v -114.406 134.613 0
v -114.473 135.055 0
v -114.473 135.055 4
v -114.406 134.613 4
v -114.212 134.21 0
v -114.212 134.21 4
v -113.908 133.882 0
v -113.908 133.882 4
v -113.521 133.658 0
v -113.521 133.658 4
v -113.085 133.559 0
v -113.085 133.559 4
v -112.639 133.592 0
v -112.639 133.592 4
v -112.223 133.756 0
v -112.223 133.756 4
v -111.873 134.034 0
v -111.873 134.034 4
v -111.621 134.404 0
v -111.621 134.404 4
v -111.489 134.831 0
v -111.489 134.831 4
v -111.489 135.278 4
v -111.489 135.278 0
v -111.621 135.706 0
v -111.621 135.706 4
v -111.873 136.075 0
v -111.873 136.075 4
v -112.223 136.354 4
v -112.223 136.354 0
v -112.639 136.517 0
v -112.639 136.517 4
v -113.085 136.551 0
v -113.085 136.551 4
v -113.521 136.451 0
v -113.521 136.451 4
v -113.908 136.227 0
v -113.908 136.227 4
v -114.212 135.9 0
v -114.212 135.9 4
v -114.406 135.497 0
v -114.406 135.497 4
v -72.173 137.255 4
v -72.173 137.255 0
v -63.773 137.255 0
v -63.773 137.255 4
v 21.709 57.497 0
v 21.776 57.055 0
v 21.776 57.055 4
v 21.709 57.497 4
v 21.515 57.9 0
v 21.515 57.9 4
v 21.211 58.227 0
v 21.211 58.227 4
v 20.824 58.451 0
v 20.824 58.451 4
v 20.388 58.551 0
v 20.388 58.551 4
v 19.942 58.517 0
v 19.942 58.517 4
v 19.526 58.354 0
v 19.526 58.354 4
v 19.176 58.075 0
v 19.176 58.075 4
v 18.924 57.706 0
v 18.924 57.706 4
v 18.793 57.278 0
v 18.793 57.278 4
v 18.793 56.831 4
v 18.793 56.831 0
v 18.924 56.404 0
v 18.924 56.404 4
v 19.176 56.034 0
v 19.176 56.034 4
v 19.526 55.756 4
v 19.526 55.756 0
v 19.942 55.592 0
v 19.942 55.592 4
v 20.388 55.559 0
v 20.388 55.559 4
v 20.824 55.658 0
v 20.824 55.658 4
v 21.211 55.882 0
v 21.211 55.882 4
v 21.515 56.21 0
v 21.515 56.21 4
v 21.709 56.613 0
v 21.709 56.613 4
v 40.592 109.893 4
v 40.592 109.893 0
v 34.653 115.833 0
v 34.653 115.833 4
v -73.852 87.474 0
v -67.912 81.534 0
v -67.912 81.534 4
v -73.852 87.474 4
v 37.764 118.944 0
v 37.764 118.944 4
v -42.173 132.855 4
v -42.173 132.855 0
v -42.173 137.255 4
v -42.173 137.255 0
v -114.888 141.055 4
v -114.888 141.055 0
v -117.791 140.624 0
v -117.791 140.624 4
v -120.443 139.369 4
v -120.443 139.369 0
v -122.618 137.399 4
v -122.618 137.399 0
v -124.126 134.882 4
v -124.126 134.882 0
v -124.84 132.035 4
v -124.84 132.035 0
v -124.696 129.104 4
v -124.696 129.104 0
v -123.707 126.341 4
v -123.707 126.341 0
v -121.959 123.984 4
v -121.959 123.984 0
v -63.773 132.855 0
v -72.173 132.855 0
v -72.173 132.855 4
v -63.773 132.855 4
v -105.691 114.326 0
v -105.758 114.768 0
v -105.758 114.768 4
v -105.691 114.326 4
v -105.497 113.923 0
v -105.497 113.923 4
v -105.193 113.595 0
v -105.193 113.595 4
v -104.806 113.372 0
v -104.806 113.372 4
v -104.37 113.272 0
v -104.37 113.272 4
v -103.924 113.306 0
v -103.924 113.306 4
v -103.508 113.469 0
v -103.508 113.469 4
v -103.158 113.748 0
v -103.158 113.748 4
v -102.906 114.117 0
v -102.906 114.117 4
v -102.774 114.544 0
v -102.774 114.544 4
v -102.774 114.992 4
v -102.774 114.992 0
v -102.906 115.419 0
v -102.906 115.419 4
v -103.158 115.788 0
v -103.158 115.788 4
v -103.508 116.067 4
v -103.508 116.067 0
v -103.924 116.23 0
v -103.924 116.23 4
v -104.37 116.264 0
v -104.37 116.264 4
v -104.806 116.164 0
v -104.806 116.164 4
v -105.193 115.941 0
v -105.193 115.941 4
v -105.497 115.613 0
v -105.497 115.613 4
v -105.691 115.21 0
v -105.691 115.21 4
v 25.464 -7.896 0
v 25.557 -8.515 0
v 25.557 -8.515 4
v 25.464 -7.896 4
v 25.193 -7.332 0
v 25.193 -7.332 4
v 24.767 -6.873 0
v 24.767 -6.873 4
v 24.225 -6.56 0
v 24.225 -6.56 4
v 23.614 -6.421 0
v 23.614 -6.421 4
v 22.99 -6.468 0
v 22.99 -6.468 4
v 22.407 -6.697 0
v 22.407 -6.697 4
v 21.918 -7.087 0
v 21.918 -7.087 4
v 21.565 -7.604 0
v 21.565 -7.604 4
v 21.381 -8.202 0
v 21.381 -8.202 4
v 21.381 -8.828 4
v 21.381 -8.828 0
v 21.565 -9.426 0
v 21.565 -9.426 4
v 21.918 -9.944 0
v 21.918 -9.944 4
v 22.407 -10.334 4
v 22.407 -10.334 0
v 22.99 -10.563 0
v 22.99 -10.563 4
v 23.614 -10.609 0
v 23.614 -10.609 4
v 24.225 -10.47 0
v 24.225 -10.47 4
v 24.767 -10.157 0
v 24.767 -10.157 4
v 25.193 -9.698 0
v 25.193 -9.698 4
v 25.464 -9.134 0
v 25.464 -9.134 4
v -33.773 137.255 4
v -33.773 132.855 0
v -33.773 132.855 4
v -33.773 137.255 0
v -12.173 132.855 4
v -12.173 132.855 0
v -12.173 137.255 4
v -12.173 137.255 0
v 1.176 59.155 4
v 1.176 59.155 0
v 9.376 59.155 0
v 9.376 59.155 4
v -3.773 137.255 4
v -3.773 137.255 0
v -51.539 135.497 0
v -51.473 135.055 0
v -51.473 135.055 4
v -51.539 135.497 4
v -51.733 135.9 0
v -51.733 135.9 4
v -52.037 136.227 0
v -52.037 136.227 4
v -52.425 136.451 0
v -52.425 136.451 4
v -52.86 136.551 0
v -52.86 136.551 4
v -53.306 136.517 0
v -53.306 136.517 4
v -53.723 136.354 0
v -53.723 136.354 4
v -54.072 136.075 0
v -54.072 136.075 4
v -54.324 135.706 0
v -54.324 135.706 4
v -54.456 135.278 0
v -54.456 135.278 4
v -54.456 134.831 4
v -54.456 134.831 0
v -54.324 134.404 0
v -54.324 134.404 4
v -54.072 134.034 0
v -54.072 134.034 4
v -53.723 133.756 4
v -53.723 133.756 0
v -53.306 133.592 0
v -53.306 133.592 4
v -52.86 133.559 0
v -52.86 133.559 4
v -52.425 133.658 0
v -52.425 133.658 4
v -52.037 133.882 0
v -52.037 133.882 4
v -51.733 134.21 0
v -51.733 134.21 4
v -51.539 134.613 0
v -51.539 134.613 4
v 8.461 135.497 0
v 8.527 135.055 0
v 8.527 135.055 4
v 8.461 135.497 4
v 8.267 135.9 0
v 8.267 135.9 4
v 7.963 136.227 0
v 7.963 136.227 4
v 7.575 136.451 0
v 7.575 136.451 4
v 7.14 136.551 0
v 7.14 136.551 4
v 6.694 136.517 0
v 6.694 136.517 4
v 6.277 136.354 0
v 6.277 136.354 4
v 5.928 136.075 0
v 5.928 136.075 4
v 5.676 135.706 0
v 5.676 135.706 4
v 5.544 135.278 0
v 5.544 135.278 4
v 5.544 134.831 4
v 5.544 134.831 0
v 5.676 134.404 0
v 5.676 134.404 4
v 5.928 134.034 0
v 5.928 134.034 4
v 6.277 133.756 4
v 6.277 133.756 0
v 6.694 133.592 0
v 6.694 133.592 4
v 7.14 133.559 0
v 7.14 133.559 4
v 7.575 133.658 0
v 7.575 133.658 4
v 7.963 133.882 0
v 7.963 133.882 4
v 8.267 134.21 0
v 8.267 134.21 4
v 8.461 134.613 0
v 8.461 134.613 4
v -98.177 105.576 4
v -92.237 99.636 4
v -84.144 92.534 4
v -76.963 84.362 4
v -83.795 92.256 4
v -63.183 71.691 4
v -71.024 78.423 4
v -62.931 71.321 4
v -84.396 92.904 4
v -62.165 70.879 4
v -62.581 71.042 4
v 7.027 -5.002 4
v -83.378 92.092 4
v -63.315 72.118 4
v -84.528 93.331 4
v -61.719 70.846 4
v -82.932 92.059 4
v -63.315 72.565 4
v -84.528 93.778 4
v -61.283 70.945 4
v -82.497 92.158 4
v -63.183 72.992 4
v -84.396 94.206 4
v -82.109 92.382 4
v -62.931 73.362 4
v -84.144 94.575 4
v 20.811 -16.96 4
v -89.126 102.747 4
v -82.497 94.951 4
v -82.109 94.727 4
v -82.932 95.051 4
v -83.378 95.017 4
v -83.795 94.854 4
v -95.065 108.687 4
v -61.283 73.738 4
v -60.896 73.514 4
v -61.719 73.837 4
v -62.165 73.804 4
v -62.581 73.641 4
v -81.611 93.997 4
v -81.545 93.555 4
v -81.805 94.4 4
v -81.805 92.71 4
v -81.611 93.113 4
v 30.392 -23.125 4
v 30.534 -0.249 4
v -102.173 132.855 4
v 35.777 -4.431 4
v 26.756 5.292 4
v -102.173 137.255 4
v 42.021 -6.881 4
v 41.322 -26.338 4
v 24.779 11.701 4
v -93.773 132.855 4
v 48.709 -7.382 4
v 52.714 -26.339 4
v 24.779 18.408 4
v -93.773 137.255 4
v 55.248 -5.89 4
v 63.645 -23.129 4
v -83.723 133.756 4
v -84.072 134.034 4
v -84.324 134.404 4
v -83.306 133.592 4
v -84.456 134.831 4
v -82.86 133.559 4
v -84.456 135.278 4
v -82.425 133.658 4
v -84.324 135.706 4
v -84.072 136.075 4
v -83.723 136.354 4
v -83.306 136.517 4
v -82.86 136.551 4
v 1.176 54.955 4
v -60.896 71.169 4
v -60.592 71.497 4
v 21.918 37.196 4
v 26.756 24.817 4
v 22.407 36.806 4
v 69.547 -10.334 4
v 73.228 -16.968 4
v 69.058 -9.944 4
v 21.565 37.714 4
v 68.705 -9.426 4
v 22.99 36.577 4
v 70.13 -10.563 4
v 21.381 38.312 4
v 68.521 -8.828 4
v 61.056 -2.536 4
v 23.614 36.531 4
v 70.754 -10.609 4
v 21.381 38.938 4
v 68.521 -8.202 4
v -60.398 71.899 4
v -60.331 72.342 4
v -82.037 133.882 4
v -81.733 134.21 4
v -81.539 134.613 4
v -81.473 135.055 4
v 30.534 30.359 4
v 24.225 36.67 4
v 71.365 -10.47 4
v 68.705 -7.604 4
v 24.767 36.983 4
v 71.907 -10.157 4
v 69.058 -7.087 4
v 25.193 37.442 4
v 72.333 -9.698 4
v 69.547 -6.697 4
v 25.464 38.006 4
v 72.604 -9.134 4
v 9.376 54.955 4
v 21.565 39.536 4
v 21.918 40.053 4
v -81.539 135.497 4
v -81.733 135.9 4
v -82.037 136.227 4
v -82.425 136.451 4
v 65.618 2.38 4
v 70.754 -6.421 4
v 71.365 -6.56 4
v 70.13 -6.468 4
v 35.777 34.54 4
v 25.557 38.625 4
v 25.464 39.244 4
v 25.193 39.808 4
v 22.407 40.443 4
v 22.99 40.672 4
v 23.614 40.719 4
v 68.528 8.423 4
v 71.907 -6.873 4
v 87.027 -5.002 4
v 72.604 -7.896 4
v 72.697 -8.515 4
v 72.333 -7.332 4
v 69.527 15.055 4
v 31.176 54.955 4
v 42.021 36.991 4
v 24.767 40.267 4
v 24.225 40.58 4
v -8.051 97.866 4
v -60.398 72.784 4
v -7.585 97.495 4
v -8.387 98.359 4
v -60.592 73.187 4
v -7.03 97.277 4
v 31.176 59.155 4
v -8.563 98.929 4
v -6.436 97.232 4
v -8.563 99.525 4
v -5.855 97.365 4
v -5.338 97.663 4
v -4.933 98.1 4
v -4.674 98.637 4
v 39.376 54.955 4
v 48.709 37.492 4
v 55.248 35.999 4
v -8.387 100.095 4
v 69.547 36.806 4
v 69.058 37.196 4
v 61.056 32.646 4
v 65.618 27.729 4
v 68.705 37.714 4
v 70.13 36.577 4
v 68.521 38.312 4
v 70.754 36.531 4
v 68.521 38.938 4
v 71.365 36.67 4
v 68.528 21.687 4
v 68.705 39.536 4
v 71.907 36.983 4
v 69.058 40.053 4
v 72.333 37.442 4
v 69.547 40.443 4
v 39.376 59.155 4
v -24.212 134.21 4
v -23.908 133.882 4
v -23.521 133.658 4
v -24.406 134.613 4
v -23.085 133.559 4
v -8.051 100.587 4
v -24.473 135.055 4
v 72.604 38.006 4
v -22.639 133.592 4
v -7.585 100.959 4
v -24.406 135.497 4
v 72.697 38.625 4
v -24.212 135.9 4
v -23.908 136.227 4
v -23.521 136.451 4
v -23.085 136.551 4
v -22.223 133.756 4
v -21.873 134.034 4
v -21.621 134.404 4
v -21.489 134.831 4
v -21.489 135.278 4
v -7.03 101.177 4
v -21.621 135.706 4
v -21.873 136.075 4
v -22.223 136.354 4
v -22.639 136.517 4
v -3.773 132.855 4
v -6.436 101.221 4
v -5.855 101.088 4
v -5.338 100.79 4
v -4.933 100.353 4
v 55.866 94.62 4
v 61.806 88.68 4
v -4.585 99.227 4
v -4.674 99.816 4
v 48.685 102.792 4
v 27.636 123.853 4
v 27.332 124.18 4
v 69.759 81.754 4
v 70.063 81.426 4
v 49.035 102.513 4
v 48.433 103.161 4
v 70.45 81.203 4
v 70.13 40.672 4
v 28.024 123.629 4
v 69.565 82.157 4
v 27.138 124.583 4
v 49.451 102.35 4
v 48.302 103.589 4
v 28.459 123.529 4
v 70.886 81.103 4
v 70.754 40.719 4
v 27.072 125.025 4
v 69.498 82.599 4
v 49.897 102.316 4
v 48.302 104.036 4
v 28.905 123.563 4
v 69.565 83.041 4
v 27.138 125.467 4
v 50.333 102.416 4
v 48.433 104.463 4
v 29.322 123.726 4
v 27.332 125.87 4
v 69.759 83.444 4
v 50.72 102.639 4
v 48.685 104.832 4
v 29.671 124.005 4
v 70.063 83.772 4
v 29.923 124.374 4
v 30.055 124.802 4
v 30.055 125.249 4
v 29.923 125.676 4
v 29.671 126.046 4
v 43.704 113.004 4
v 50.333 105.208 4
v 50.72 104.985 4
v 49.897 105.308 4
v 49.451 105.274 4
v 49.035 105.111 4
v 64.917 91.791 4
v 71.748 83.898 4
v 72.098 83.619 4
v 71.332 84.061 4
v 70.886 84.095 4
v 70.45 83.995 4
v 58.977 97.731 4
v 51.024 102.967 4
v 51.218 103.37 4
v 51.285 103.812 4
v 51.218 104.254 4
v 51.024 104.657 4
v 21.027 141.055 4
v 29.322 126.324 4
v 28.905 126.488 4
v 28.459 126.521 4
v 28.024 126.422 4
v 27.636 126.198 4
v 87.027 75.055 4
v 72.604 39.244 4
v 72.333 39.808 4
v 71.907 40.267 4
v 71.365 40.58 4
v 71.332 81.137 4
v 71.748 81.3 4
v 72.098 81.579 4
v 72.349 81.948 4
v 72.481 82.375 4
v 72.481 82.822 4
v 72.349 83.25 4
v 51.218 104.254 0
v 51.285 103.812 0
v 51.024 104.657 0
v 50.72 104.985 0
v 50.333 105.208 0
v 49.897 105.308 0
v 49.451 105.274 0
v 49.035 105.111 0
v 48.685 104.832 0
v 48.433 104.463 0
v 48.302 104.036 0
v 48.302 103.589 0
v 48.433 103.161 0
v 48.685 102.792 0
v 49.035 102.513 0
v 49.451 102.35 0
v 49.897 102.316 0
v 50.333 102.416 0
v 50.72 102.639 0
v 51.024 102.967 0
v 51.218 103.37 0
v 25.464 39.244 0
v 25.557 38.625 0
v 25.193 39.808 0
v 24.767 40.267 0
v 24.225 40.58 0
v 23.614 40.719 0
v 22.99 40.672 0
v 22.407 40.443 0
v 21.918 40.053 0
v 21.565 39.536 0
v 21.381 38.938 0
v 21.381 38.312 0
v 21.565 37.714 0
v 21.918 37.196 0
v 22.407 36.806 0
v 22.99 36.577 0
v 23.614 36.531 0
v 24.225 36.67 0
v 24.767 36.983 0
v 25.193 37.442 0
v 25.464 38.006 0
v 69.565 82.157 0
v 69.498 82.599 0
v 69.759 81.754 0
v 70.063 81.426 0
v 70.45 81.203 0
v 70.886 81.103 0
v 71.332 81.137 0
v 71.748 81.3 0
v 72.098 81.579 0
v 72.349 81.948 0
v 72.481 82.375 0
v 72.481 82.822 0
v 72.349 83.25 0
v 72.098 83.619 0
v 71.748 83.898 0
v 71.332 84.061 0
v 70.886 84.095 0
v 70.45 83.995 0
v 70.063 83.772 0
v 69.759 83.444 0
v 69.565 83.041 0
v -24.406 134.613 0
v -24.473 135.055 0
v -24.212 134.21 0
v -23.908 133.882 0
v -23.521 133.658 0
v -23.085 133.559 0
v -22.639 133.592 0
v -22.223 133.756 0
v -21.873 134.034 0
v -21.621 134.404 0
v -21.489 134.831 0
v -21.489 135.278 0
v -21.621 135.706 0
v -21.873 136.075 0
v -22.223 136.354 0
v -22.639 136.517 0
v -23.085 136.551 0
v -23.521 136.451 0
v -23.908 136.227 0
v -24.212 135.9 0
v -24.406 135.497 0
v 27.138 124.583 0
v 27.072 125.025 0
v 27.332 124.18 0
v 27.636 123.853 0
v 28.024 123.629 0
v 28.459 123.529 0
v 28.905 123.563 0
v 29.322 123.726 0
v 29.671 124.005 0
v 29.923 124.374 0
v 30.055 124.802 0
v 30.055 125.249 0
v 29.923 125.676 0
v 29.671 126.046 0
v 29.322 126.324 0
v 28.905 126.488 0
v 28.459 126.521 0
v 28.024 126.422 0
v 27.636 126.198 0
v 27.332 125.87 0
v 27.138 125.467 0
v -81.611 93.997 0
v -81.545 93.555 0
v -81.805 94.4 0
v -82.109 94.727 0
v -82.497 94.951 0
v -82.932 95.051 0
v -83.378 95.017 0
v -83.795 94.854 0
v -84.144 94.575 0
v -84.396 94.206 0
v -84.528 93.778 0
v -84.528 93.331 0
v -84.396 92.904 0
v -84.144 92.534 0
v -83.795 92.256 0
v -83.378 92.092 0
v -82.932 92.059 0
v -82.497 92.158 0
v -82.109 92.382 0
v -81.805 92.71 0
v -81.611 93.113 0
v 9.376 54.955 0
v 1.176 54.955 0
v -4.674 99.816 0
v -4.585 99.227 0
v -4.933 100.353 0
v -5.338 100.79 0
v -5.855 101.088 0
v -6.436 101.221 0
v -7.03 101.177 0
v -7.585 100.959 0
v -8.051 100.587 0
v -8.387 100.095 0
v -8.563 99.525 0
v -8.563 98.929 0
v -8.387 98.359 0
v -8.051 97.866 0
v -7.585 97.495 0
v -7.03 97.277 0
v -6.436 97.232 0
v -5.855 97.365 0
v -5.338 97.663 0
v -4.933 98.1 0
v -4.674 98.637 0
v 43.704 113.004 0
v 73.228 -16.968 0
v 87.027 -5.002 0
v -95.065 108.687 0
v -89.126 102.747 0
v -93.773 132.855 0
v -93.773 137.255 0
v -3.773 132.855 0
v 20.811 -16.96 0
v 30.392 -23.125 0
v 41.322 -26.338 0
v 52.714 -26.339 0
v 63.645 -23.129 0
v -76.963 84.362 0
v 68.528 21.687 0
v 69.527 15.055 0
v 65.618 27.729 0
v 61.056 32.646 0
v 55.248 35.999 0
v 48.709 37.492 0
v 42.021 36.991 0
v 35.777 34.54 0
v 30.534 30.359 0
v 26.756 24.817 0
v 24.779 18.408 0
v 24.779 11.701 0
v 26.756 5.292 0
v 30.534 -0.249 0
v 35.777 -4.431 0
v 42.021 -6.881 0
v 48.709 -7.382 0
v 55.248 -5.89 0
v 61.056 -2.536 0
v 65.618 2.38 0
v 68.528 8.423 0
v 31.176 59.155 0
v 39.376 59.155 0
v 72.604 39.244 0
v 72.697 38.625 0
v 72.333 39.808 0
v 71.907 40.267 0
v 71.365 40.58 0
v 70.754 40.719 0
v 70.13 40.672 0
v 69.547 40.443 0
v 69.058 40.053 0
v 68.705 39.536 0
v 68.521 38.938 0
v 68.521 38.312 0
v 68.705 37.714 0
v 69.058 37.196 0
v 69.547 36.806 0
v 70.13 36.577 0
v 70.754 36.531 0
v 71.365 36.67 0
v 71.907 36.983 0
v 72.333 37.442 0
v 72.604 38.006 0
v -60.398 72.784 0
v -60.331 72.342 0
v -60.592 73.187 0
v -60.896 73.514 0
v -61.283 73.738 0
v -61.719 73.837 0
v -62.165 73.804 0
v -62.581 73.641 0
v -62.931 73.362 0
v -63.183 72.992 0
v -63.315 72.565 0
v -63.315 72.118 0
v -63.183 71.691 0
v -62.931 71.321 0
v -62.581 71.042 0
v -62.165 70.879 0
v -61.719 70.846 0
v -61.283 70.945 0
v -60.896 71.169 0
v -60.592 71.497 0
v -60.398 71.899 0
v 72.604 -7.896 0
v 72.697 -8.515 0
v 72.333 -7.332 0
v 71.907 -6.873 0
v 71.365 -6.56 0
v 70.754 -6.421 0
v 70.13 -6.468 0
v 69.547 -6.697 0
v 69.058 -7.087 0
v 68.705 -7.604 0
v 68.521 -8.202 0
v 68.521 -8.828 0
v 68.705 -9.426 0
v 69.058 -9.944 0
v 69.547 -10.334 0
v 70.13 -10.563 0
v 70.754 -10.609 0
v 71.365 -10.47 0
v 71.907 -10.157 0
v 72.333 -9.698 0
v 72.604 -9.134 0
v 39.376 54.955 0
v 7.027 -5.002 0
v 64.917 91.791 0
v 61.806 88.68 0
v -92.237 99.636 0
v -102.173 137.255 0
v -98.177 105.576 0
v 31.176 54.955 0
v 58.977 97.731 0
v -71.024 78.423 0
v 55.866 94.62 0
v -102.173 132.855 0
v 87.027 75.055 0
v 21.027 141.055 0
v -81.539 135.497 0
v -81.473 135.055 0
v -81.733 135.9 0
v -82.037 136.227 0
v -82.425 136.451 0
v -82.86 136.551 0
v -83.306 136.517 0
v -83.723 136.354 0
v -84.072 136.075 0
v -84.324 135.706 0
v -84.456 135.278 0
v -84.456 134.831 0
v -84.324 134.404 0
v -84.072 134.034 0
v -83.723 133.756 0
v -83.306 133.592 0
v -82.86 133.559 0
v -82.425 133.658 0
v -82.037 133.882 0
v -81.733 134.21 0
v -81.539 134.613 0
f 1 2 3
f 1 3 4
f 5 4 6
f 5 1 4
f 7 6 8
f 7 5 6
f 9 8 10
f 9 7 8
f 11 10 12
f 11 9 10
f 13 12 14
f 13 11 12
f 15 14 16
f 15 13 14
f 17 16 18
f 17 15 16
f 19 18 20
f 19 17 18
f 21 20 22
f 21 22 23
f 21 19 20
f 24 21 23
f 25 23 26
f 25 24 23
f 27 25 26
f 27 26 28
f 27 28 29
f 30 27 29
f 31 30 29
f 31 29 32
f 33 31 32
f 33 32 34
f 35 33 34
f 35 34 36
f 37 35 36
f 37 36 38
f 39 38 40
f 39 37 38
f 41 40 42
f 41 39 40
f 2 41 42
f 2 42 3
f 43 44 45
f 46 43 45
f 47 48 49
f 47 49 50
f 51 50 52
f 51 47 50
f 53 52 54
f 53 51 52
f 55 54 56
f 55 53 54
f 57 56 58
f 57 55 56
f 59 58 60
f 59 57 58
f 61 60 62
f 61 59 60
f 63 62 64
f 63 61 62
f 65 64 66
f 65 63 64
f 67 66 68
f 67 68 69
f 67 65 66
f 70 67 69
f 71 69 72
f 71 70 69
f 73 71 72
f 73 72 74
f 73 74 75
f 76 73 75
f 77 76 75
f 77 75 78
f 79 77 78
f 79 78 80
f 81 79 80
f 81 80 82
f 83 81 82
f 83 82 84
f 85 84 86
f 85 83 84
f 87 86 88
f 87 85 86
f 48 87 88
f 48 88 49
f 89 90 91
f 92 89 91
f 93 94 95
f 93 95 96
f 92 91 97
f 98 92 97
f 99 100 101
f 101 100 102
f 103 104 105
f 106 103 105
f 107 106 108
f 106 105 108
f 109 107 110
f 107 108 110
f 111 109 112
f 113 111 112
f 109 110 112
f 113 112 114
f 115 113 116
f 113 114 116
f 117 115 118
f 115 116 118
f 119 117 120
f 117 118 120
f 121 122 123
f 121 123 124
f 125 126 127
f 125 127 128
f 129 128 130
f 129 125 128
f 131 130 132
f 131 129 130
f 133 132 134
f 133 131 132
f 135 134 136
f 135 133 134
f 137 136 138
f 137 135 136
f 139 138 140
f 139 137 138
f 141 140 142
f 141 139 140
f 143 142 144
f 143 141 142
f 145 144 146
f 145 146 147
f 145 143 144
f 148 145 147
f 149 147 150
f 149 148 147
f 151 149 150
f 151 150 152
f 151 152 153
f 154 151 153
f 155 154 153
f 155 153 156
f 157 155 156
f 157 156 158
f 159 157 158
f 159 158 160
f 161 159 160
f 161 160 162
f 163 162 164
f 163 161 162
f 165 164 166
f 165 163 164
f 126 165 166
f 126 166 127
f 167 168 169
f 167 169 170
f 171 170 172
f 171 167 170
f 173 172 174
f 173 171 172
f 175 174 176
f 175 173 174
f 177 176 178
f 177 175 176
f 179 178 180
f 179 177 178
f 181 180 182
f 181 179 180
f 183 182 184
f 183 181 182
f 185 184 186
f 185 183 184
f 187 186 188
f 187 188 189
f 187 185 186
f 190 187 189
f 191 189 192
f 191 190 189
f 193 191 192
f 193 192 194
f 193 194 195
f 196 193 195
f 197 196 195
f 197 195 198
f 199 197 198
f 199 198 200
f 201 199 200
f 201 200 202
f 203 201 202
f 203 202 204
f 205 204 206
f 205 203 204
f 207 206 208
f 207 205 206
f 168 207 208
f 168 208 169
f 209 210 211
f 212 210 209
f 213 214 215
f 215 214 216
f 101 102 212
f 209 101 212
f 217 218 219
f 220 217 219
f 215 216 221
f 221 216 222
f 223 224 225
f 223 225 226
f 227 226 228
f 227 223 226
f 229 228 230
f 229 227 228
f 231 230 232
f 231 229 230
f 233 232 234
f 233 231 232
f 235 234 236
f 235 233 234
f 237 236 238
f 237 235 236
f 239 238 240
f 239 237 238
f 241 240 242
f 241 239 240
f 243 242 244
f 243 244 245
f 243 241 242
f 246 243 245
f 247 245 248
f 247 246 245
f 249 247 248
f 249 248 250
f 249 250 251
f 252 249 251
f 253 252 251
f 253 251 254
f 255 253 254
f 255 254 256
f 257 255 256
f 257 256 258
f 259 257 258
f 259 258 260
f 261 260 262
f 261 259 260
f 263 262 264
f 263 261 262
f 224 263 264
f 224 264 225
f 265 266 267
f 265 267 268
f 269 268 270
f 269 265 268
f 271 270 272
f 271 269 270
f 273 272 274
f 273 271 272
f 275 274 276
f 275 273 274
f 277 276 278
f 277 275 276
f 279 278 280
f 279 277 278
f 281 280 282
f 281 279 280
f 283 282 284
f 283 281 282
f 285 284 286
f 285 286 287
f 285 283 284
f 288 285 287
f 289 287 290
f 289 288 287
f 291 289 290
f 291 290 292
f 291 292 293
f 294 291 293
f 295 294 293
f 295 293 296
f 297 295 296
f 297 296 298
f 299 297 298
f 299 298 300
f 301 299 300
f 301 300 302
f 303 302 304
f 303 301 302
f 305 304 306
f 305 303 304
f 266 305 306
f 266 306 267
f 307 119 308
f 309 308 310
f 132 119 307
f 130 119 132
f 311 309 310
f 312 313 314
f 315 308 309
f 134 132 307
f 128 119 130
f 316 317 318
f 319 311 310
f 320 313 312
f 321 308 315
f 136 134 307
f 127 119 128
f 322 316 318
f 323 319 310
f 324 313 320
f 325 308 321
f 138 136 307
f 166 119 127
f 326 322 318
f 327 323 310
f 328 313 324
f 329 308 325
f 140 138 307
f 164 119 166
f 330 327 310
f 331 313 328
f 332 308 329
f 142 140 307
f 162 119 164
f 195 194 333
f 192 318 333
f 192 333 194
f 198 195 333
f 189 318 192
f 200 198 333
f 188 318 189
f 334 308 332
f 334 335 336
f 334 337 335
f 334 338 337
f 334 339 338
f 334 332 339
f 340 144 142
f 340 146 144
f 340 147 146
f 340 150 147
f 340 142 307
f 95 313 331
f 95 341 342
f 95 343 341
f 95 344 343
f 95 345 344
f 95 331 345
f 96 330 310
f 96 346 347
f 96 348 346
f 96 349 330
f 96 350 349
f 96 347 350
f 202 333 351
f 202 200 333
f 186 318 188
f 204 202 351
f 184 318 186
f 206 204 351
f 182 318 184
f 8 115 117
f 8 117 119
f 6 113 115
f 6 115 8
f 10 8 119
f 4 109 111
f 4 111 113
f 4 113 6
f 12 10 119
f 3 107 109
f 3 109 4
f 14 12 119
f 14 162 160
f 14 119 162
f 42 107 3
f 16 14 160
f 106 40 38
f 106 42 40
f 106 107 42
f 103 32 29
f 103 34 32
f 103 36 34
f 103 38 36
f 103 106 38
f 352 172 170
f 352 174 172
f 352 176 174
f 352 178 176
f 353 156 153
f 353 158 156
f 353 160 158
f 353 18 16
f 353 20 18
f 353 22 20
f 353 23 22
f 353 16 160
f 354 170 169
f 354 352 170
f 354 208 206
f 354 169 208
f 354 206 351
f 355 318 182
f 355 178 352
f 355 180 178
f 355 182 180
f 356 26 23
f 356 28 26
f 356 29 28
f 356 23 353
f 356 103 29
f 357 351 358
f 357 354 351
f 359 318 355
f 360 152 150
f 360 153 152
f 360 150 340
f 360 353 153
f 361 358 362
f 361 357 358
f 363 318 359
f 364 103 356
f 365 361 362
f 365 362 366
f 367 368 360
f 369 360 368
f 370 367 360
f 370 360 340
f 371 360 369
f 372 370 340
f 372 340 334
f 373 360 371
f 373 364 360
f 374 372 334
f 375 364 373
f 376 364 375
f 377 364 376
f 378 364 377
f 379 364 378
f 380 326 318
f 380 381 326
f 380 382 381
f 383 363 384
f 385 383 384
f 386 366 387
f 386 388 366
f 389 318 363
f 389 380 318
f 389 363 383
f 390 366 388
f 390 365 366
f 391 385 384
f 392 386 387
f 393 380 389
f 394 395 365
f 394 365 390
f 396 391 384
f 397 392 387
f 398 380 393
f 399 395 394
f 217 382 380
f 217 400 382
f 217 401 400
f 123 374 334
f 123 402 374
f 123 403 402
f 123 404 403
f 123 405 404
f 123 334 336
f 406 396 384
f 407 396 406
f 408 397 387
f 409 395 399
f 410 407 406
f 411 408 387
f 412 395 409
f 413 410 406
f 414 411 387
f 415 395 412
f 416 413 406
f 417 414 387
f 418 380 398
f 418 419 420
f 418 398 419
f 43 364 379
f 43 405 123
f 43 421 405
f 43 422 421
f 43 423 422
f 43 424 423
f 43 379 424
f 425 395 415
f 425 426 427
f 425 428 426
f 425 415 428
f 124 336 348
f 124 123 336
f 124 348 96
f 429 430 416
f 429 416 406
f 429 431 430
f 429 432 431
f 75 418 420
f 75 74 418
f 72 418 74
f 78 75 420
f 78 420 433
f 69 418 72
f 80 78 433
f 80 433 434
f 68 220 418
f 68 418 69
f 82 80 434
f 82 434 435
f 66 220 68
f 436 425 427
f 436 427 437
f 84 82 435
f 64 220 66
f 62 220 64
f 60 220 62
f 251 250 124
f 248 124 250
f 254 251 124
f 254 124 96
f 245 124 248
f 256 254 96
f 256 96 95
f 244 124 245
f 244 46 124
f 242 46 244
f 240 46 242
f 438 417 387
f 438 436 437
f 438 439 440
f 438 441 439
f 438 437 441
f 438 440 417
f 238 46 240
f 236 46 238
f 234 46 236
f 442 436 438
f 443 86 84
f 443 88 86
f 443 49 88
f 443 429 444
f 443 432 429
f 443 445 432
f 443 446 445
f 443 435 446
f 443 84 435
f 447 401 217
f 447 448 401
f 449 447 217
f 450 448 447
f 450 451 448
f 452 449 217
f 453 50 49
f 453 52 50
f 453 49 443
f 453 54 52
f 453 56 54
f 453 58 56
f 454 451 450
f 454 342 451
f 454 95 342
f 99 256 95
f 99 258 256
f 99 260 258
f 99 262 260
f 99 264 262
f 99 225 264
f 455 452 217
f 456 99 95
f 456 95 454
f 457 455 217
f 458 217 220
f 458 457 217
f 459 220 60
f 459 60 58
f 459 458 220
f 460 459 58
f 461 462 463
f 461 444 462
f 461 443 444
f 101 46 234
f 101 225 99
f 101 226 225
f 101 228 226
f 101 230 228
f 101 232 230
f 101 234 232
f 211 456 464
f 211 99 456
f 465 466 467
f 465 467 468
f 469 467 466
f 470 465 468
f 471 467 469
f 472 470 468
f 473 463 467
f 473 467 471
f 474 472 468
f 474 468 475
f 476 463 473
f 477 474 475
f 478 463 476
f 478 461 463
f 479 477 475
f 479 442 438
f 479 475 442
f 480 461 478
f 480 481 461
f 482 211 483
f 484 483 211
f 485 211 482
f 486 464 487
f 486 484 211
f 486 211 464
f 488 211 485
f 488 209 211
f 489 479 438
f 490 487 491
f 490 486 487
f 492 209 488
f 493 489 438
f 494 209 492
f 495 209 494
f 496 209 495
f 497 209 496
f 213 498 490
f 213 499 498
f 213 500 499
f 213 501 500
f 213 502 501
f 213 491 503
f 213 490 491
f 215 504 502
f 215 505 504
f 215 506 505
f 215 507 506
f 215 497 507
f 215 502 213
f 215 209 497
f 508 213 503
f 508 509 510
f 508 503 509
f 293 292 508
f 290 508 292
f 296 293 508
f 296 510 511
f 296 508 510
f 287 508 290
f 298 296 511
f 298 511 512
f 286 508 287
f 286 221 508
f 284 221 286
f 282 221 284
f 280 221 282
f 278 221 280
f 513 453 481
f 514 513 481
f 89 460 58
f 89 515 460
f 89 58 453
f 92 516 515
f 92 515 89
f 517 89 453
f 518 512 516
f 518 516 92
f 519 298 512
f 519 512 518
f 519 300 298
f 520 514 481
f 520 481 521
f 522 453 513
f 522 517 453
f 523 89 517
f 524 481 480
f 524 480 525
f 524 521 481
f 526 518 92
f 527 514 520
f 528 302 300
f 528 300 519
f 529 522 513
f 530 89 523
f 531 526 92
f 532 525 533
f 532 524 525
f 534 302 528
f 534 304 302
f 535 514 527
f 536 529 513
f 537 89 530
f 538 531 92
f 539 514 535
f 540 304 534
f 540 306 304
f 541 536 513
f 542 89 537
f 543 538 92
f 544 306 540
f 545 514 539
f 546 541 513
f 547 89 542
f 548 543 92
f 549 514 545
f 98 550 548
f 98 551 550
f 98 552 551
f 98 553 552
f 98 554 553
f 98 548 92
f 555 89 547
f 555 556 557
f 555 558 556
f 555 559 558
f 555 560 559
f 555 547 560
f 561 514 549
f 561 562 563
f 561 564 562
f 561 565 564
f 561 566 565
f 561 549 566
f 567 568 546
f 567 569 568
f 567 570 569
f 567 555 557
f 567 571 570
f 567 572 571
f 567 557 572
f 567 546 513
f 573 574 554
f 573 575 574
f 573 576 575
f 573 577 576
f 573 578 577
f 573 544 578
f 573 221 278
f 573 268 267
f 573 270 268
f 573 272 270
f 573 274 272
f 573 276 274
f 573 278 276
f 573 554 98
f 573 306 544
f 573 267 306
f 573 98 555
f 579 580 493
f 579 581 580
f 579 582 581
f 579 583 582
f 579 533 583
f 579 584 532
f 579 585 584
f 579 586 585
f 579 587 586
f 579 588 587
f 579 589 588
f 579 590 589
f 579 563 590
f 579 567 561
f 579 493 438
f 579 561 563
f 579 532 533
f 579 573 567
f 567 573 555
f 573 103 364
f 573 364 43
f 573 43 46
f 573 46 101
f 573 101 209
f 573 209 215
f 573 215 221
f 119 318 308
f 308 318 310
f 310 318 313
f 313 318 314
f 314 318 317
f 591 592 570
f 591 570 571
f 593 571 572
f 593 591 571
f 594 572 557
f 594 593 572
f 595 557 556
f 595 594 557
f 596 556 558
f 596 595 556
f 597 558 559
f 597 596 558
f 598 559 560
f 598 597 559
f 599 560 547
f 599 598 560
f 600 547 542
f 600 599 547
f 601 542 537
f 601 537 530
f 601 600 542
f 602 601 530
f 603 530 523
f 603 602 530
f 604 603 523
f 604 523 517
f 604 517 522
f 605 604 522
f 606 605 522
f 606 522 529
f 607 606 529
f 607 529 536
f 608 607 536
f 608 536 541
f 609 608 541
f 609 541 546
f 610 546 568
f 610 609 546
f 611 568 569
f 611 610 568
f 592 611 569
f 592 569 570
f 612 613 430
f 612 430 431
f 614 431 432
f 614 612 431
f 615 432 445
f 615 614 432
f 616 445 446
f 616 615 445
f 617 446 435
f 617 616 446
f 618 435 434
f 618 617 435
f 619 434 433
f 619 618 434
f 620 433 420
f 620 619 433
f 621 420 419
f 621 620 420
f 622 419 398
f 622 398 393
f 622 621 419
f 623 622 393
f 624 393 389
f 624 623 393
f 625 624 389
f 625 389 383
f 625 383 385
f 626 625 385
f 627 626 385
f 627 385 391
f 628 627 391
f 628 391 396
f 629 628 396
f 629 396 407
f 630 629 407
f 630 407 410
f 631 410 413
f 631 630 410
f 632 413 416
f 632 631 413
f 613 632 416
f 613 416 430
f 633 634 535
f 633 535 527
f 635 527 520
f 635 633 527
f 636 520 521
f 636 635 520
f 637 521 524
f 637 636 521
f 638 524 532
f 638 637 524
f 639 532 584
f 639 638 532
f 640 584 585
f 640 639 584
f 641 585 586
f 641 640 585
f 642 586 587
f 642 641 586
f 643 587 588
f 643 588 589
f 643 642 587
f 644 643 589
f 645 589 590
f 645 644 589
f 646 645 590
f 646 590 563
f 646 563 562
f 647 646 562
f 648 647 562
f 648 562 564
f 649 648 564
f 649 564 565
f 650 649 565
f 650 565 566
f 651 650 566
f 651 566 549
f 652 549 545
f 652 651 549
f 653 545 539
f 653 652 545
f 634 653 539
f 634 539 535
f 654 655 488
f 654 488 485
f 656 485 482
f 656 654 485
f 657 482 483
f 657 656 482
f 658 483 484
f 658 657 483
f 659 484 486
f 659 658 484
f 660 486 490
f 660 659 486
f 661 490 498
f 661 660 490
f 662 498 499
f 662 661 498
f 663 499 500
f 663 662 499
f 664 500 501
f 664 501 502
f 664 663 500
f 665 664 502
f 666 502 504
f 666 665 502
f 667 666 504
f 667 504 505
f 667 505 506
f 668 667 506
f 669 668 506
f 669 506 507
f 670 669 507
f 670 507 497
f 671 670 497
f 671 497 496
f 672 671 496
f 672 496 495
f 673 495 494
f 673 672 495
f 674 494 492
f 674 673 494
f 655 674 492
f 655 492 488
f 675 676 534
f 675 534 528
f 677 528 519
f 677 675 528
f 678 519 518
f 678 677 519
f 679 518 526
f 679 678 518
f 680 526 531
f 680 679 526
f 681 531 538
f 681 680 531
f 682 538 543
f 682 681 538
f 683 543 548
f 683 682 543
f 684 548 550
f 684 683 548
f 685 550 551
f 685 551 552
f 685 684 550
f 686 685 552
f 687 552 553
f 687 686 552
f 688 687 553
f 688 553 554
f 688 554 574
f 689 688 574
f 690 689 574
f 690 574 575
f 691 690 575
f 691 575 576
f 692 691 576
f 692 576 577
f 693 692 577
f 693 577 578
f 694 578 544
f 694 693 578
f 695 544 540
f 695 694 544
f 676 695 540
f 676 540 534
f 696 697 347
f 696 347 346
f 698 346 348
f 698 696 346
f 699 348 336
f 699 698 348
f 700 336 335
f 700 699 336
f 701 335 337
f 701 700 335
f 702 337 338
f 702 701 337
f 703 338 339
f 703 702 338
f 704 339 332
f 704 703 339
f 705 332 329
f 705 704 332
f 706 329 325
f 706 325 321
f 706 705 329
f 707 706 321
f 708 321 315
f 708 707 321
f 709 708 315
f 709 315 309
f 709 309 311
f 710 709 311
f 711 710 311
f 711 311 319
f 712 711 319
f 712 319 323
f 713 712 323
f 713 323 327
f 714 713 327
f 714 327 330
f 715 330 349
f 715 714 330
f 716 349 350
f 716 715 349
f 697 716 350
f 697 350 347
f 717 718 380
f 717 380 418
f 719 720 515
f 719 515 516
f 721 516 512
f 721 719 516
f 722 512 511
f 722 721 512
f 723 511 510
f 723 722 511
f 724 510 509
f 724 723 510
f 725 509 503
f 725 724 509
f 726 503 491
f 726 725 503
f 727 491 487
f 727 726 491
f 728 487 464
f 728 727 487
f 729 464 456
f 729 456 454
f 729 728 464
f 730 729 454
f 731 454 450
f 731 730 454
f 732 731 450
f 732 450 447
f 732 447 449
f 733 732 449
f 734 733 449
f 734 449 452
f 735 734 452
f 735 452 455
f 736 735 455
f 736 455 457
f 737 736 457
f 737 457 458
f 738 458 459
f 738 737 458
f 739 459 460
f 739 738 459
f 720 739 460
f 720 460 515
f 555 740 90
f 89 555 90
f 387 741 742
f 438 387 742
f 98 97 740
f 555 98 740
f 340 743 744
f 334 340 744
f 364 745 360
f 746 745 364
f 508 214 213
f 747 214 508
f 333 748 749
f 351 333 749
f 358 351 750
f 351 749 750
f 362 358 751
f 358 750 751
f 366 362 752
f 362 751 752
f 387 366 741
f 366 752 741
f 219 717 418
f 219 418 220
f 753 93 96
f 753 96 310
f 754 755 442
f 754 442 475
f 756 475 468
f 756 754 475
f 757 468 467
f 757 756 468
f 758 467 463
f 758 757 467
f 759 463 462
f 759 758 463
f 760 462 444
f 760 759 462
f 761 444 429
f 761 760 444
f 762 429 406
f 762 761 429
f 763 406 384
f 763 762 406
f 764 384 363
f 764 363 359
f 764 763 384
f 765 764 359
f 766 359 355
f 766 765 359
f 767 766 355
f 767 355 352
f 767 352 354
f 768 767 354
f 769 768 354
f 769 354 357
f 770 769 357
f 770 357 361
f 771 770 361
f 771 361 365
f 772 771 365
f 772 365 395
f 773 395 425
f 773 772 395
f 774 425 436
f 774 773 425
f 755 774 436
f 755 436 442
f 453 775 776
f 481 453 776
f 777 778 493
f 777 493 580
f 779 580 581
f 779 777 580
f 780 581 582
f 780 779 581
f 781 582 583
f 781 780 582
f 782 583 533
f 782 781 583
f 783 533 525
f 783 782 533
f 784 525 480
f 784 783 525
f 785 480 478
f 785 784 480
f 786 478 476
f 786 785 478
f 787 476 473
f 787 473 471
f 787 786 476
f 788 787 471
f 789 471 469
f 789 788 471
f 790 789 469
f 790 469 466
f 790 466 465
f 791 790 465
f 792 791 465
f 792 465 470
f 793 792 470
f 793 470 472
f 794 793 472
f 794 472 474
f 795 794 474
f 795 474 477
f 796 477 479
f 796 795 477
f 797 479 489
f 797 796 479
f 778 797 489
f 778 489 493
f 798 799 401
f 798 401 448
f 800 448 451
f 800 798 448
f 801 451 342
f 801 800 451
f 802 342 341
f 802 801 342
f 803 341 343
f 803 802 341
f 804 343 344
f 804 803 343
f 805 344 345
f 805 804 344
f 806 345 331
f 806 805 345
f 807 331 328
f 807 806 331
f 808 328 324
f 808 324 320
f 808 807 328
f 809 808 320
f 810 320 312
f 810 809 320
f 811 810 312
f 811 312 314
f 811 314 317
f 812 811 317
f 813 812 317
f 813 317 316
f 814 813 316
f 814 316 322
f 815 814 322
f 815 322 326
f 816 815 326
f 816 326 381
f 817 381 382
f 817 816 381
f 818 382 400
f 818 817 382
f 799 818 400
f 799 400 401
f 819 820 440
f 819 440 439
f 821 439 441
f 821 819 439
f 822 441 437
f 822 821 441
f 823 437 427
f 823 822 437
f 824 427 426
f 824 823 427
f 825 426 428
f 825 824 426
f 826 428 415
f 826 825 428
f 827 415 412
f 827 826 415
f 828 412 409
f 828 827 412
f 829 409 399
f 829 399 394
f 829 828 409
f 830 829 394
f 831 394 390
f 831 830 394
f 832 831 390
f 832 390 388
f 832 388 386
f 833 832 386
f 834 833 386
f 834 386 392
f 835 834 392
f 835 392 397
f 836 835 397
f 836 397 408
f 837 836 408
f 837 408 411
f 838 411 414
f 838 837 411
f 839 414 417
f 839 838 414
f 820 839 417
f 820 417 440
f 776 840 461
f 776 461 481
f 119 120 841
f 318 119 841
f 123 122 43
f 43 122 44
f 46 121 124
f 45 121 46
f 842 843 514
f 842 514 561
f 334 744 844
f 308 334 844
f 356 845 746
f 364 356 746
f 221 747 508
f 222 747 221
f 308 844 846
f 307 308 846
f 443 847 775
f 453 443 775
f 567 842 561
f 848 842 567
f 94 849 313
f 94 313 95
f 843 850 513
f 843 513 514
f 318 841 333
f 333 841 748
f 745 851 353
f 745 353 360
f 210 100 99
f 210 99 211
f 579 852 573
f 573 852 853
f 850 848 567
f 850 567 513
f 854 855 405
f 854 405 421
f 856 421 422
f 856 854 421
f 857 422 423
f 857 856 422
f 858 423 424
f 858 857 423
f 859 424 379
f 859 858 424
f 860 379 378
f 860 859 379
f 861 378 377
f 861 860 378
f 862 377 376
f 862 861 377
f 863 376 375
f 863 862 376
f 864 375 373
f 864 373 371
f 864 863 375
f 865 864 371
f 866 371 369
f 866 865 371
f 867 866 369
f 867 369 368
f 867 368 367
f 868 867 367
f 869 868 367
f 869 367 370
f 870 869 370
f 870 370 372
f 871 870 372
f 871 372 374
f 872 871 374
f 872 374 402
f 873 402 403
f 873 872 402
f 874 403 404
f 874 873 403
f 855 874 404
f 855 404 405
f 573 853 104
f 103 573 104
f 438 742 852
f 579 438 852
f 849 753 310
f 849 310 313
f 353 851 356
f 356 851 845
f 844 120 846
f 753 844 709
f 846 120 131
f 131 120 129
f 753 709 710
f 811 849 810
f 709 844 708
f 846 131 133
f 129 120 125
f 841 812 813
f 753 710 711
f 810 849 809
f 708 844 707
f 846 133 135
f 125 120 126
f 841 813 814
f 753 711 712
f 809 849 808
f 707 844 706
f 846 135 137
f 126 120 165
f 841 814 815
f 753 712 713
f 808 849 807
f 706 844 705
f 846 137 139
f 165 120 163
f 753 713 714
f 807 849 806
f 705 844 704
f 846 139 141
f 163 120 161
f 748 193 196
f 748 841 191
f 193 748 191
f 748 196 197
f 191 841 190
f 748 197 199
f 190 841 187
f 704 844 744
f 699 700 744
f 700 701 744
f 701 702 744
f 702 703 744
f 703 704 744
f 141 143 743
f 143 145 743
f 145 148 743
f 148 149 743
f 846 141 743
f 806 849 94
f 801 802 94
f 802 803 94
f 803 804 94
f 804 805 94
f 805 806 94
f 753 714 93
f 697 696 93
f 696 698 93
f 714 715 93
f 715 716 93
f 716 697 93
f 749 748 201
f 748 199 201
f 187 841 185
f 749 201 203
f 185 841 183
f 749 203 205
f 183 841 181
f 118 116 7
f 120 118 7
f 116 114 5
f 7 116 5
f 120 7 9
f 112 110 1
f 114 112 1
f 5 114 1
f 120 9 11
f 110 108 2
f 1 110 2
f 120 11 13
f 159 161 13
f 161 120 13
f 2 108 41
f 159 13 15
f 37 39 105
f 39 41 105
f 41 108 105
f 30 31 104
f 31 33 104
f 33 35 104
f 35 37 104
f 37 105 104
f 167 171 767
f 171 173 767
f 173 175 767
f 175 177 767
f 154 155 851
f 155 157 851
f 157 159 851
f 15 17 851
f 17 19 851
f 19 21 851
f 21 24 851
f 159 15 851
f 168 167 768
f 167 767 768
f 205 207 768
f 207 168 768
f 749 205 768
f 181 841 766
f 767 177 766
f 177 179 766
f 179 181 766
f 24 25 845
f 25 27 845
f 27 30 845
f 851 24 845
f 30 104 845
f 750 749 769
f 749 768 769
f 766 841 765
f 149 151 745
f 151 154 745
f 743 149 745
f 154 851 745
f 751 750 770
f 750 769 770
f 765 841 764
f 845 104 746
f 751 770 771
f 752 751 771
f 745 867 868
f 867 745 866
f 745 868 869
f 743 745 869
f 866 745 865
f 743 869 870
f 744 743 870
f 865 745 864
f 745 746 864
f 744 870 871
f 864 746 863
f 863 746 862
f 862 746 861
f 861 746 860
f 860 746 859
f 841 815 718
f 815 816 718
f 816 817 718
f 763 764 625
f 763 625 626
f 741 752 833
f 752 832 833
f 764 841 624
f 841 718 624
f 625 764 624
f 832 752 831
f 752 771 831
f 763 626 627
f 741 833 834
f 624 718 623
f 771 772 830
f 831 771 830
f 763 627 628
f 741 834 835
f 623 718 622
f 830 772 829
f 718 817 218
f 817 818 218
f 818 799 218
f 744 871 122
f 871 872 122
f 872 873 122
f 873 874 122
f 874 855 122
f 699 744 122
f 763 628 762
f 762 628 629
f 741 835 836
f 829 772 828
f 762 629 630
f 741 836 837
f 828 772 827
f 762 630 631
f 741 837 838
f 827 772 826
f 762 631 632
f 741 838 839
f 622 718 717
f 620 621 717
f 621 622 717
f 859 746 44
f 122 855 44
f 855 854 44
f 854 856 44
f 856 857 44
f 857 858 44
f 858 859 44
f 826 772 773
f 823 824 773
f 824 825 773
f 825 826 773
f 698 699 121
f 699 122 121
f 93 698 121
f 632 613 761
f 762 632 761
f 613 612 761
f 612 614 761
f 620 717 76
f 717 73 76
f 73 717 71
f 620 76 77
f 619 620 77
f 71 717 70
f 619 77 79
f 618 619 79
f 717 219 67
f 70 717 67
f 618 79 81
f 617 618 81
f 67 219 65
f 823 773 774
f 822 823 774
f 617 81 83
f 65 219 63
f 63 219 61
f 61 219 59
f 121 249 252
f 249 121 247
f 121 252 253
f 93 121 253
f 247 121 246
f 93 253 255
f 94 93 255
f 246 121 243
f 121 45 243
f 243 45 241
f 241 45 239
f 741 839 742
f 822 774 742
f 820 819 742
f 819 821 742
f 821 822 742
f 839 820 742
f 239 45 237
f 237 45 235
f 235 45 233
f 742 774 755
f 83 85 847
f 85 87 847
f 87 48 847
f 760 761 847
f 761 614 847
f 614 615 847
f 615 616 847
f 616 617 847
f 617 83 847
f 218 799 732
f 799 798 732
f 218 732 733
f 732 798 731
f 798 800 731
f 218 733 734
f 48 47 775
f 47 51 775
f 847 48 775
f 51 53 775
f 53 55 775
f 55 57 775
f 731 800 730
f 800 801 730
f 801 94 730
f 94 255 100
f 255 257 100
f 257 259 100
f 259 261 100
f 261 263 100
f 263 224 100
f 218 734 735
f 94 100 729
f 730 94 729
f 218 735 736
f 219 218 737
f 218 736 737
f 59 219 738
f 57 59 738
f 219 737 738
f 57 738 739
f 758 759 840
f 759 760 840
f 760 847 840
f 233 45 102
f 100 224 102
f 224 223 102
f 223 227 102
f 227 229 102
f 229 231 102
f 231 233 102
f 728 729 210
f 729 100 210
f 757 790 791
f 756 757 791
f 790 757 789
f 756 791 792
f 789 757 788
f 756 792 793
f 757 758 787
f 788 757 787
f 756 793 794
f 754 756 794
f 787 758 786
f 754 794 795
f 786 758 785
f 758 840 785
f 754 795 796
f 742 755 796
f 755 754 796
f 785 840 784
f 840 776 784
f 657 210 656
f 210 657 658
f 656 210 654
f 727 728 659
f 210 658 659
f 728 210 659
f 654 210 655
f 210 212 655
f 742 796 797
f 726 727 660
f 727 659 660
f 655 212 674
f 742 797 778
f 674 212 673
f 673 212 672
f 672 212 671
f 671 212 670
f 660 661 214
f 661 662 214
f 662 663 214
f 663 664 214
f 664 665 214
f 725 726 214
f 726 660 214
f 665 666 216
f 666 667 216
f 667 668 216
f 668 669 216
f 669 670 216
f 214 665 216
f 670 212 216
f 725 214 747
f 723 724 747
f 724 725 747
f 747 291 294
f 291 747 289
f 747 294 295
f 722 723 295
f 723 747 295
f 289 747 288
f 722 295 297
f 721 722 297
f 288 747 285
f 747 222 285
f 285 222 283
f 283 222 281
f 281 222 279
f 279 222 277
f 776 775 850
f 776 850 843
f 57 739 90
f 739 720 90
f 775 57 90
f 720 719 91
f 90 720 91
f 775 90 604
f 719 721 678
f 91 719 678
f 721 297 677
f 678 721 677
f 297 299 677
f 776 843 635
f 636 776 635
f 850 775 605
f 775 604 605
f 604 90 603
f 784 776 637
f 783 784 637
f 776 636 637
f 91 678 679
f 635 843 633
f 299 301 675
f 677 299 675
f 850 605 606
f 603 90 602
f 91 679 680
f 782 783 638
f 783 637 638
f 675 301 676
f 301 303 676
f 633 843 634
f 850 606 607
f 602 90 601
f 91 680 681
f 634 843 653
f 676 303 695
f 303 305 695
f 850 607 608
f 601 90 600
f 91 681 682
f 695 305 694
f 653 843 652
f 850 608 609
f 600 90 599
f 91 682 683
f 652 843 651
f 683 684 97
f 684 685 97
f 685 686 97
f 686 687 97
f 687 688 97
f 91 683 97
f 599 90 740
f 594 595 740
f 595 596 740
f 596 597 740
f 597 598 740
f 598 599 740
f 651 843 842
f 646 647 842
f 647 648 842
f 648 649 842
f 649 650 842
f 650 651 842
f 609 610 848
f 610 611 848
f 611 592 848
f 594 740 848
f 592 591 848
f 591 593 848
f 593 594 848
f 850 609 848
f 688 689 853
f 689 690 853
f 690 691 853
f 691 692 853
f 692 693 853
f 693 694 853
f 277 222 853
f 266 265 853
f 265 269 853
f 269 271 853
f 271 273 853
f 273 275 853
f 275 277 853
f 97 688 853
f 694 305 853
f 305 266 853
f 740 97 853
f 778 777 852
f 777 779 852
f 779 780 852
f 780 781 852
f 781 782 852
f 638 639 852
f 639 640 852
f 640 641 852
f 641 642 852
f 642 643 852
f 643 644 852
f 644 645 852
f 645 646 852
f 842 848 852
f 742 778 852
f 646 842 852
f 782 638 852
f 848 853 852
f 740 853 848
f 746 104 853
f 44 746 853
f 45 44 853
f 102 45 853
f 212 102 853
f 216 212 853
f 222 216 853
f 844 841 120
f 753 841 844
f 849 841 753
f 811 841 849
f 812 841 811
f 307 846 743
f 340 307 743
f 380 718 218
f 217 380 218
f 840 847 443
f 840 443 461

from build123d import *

# Parameters (mm, degrees)
SKETCH_1_R      = 1.5
SKETCH_1_R_2    = 22.5
SKETCH_1_R_3    = 2.1
SKETCH_1_R_4    = 2
SKETCH_1_W      = 8.4
SKETCH_1_H      = 4.4
SKETCH_1_W_2    = 8.2
SKETCH_1_H_2    = 4.2
EXTRUDE_1_DEPTH = 4


with BuildPart() as part:
    # 草图1 → 凸台-拉伸1 (new body)
    with BuildSketch(Plane.XY):
        with BuildLine():
            Line((7.027428163, -5.002489357), (20.810808237, -16.960441938))
            ThreePointArc((20.810808237, -16.960441938), (47.017847244, -26.746287876), (73.227648339, -16.967842153))
            Line((73.227648339, -16.967842153), (87.027428163, -5.002489357))
            Line((87.027428163, -5.002489357), (87.027428163, 75.054738201))
            Line((87.027428163, 75.054738201), (21.027428163, 141.054738201))
            Line((21.027428163, 141.054738201), (-114.887663771, 141.054738201))
            ThreePointArc((-114.887663771, 141.054738201), (-124.126459096, 134.881572525), (-121.958731583, 123.983670389))
            Line((-121.958731583, 123.983670389), (-90.203942848, 92.228881654))
            Line((-90.203942848, 92.228881654), (7.027428163, -5.002489357))
        make_face()
        with Locations((-52.972571837, 135.054738201)):
            Circle(SKETCH_1_R, mode=Mode.SUBTRACT)
        with Locations((47.027428163, 15.054738201)):
            Circle(SKETCH_1_R_2, mode=Mode.SUBTRACT)
        with Locations(Location((-22.972571837, 135.054738201, 0), (0, 0, 180))):
            Circle(SKETCH_1_R, mode=Mode.SUBTRACT)
        with Locations((7.027428163, 135.054738201)):
            Circle(SKETCH_1_R, mode=Mode.SUBTRACT)
        with Locations(Location((-112.972571837, 135.054738201, 0), (0, 0, 180))):
            Circle(SKETCH_1_R, mode=Mode.SUBTRACT)
        with Locations((-82.972571837, 135.054738201)):
            Circle(SKETCH_1_R, mode=Mode.SUBTRACT)
        with Locations((49.784787476, 103.812097514)):
            Circle(SKETCH_1_R, mode=Mode.SUBTRACT)
        with Locations(Location((70.997990912, 82.598894078, 0), (0, 0, 180))):
            Circle(SKETCH_1_R, mode=Mode.SUBTRACT)
        with Locations(Location((28.571584041, 125.025300949, 0), (0, 0, 180))):
            Circle(SKETCH_1_R, mode=Mode.SUBTRACT)
        with Locations((70.597428163, 38.624738201)):
            Circle(SKETCH_1_R_3, mode=Mode.SUBTRACT)
        with Locations((70.597428163, -8.515261799)):
            Circle(SKETCH_1_R_3, mode=Mode.SUBTRACT)
        with Locations((23.457428163, -8.515261799)):
            Circle(SKETCH_1_R_3, mode=Mode.SUBTRACT)
        with Locations((23.457428163, 38.624738201)):
            Circle(SKETCH_1_R_3, mode=Mode.SUBTRACT)
        with Locations((-83.04451802, 93.554738201)):
            Circle(SKETCH_1_R, mode=Mode.SUBTRACT)
        with Locations((-61.831314585, 72.341534765)):
            Circle(SKETCH_1_R, mode=Mode.SUBTRACT)
        with Locations(Location((-104.257721456, 114.767941637, 0), (0, 0, 180))):
            Circle(SKETCH_1_R, mode=Mode.SUBTRACT)
        with Locations((20.275835807, 57.054738201)):
            Circle(SKETCH_1_R, mode=Mode.SUBTRACT)
        with Locations((-6.58531727, 99.226748532)):
            Circle(SKETCH_1_R_4, mode=Mode.SUBTRACT)
        with Locations((-37.972571837, 135.054738201)):
            Rectangle(SKETCH_1_W, SKETCH_1_H, mode=Mode.SUBTRACT)
        with Locations((-7.972571837, 135.054738201)):
            Rectangle(SKETCH_1_W, SKETCH_1_H, mode=Mode.SUBTRACT)
        with Locations((-97.972571837, 135.054738201)):
            Rectangle(SKETCH_1_W, SKETCH_1_H, mode=Mode.SUBTRACT)
        with Locations((-67.972571837, 135.054738201)):
            Rectangle(SKETCH_1_W, SKETCH_1_H, mode=Mode.SUBTRACT)
        Polygon((55.865905794, 94.619709358), (61.805602756, 88.680012396), (64.916872594, 91.791282234), (58.977175632, 97.730979196), align=None, mode=Mode.SUBTRACT)
        Polygon((34.652702359, 115.832912794), (37.763972196, 118.944182631), (43.703669158, 113.004485669), (40.592399321, 109.893215832), align=None, mode=Mode.SUBTRACT)
        Polygon((-73.852129865, 87.473619883), (-76.963399702, 84.362350046), (-71.02370274, 78.422653084), (-67.912432903, 81.533922921), align=None, mode=Mode.SUBTRACT)
        Polygon((-89.125636339, 102.747126356), (-92.236906176, 99.635856519), (-98.176603138, 105.575553481), (-95.065333301, 108.686823318), align=None, mode=Mode.SUBTRACT)
        with Locations((5.275835807, 57.054738201)):
            Rectangle(SKETCH_1_W_2, SKETCH_1_H_2, mode=Mode.SUBTRACT)
        with Locations((35.275835807, 57.054738201)):
            Rectangle(SKETCH_1_W_2, SKETCH_1_H_2, mode=Mode.SUBTRACT)
    extrude(amount=EXTRUDE_1_DEPTH)


solid = part.part
